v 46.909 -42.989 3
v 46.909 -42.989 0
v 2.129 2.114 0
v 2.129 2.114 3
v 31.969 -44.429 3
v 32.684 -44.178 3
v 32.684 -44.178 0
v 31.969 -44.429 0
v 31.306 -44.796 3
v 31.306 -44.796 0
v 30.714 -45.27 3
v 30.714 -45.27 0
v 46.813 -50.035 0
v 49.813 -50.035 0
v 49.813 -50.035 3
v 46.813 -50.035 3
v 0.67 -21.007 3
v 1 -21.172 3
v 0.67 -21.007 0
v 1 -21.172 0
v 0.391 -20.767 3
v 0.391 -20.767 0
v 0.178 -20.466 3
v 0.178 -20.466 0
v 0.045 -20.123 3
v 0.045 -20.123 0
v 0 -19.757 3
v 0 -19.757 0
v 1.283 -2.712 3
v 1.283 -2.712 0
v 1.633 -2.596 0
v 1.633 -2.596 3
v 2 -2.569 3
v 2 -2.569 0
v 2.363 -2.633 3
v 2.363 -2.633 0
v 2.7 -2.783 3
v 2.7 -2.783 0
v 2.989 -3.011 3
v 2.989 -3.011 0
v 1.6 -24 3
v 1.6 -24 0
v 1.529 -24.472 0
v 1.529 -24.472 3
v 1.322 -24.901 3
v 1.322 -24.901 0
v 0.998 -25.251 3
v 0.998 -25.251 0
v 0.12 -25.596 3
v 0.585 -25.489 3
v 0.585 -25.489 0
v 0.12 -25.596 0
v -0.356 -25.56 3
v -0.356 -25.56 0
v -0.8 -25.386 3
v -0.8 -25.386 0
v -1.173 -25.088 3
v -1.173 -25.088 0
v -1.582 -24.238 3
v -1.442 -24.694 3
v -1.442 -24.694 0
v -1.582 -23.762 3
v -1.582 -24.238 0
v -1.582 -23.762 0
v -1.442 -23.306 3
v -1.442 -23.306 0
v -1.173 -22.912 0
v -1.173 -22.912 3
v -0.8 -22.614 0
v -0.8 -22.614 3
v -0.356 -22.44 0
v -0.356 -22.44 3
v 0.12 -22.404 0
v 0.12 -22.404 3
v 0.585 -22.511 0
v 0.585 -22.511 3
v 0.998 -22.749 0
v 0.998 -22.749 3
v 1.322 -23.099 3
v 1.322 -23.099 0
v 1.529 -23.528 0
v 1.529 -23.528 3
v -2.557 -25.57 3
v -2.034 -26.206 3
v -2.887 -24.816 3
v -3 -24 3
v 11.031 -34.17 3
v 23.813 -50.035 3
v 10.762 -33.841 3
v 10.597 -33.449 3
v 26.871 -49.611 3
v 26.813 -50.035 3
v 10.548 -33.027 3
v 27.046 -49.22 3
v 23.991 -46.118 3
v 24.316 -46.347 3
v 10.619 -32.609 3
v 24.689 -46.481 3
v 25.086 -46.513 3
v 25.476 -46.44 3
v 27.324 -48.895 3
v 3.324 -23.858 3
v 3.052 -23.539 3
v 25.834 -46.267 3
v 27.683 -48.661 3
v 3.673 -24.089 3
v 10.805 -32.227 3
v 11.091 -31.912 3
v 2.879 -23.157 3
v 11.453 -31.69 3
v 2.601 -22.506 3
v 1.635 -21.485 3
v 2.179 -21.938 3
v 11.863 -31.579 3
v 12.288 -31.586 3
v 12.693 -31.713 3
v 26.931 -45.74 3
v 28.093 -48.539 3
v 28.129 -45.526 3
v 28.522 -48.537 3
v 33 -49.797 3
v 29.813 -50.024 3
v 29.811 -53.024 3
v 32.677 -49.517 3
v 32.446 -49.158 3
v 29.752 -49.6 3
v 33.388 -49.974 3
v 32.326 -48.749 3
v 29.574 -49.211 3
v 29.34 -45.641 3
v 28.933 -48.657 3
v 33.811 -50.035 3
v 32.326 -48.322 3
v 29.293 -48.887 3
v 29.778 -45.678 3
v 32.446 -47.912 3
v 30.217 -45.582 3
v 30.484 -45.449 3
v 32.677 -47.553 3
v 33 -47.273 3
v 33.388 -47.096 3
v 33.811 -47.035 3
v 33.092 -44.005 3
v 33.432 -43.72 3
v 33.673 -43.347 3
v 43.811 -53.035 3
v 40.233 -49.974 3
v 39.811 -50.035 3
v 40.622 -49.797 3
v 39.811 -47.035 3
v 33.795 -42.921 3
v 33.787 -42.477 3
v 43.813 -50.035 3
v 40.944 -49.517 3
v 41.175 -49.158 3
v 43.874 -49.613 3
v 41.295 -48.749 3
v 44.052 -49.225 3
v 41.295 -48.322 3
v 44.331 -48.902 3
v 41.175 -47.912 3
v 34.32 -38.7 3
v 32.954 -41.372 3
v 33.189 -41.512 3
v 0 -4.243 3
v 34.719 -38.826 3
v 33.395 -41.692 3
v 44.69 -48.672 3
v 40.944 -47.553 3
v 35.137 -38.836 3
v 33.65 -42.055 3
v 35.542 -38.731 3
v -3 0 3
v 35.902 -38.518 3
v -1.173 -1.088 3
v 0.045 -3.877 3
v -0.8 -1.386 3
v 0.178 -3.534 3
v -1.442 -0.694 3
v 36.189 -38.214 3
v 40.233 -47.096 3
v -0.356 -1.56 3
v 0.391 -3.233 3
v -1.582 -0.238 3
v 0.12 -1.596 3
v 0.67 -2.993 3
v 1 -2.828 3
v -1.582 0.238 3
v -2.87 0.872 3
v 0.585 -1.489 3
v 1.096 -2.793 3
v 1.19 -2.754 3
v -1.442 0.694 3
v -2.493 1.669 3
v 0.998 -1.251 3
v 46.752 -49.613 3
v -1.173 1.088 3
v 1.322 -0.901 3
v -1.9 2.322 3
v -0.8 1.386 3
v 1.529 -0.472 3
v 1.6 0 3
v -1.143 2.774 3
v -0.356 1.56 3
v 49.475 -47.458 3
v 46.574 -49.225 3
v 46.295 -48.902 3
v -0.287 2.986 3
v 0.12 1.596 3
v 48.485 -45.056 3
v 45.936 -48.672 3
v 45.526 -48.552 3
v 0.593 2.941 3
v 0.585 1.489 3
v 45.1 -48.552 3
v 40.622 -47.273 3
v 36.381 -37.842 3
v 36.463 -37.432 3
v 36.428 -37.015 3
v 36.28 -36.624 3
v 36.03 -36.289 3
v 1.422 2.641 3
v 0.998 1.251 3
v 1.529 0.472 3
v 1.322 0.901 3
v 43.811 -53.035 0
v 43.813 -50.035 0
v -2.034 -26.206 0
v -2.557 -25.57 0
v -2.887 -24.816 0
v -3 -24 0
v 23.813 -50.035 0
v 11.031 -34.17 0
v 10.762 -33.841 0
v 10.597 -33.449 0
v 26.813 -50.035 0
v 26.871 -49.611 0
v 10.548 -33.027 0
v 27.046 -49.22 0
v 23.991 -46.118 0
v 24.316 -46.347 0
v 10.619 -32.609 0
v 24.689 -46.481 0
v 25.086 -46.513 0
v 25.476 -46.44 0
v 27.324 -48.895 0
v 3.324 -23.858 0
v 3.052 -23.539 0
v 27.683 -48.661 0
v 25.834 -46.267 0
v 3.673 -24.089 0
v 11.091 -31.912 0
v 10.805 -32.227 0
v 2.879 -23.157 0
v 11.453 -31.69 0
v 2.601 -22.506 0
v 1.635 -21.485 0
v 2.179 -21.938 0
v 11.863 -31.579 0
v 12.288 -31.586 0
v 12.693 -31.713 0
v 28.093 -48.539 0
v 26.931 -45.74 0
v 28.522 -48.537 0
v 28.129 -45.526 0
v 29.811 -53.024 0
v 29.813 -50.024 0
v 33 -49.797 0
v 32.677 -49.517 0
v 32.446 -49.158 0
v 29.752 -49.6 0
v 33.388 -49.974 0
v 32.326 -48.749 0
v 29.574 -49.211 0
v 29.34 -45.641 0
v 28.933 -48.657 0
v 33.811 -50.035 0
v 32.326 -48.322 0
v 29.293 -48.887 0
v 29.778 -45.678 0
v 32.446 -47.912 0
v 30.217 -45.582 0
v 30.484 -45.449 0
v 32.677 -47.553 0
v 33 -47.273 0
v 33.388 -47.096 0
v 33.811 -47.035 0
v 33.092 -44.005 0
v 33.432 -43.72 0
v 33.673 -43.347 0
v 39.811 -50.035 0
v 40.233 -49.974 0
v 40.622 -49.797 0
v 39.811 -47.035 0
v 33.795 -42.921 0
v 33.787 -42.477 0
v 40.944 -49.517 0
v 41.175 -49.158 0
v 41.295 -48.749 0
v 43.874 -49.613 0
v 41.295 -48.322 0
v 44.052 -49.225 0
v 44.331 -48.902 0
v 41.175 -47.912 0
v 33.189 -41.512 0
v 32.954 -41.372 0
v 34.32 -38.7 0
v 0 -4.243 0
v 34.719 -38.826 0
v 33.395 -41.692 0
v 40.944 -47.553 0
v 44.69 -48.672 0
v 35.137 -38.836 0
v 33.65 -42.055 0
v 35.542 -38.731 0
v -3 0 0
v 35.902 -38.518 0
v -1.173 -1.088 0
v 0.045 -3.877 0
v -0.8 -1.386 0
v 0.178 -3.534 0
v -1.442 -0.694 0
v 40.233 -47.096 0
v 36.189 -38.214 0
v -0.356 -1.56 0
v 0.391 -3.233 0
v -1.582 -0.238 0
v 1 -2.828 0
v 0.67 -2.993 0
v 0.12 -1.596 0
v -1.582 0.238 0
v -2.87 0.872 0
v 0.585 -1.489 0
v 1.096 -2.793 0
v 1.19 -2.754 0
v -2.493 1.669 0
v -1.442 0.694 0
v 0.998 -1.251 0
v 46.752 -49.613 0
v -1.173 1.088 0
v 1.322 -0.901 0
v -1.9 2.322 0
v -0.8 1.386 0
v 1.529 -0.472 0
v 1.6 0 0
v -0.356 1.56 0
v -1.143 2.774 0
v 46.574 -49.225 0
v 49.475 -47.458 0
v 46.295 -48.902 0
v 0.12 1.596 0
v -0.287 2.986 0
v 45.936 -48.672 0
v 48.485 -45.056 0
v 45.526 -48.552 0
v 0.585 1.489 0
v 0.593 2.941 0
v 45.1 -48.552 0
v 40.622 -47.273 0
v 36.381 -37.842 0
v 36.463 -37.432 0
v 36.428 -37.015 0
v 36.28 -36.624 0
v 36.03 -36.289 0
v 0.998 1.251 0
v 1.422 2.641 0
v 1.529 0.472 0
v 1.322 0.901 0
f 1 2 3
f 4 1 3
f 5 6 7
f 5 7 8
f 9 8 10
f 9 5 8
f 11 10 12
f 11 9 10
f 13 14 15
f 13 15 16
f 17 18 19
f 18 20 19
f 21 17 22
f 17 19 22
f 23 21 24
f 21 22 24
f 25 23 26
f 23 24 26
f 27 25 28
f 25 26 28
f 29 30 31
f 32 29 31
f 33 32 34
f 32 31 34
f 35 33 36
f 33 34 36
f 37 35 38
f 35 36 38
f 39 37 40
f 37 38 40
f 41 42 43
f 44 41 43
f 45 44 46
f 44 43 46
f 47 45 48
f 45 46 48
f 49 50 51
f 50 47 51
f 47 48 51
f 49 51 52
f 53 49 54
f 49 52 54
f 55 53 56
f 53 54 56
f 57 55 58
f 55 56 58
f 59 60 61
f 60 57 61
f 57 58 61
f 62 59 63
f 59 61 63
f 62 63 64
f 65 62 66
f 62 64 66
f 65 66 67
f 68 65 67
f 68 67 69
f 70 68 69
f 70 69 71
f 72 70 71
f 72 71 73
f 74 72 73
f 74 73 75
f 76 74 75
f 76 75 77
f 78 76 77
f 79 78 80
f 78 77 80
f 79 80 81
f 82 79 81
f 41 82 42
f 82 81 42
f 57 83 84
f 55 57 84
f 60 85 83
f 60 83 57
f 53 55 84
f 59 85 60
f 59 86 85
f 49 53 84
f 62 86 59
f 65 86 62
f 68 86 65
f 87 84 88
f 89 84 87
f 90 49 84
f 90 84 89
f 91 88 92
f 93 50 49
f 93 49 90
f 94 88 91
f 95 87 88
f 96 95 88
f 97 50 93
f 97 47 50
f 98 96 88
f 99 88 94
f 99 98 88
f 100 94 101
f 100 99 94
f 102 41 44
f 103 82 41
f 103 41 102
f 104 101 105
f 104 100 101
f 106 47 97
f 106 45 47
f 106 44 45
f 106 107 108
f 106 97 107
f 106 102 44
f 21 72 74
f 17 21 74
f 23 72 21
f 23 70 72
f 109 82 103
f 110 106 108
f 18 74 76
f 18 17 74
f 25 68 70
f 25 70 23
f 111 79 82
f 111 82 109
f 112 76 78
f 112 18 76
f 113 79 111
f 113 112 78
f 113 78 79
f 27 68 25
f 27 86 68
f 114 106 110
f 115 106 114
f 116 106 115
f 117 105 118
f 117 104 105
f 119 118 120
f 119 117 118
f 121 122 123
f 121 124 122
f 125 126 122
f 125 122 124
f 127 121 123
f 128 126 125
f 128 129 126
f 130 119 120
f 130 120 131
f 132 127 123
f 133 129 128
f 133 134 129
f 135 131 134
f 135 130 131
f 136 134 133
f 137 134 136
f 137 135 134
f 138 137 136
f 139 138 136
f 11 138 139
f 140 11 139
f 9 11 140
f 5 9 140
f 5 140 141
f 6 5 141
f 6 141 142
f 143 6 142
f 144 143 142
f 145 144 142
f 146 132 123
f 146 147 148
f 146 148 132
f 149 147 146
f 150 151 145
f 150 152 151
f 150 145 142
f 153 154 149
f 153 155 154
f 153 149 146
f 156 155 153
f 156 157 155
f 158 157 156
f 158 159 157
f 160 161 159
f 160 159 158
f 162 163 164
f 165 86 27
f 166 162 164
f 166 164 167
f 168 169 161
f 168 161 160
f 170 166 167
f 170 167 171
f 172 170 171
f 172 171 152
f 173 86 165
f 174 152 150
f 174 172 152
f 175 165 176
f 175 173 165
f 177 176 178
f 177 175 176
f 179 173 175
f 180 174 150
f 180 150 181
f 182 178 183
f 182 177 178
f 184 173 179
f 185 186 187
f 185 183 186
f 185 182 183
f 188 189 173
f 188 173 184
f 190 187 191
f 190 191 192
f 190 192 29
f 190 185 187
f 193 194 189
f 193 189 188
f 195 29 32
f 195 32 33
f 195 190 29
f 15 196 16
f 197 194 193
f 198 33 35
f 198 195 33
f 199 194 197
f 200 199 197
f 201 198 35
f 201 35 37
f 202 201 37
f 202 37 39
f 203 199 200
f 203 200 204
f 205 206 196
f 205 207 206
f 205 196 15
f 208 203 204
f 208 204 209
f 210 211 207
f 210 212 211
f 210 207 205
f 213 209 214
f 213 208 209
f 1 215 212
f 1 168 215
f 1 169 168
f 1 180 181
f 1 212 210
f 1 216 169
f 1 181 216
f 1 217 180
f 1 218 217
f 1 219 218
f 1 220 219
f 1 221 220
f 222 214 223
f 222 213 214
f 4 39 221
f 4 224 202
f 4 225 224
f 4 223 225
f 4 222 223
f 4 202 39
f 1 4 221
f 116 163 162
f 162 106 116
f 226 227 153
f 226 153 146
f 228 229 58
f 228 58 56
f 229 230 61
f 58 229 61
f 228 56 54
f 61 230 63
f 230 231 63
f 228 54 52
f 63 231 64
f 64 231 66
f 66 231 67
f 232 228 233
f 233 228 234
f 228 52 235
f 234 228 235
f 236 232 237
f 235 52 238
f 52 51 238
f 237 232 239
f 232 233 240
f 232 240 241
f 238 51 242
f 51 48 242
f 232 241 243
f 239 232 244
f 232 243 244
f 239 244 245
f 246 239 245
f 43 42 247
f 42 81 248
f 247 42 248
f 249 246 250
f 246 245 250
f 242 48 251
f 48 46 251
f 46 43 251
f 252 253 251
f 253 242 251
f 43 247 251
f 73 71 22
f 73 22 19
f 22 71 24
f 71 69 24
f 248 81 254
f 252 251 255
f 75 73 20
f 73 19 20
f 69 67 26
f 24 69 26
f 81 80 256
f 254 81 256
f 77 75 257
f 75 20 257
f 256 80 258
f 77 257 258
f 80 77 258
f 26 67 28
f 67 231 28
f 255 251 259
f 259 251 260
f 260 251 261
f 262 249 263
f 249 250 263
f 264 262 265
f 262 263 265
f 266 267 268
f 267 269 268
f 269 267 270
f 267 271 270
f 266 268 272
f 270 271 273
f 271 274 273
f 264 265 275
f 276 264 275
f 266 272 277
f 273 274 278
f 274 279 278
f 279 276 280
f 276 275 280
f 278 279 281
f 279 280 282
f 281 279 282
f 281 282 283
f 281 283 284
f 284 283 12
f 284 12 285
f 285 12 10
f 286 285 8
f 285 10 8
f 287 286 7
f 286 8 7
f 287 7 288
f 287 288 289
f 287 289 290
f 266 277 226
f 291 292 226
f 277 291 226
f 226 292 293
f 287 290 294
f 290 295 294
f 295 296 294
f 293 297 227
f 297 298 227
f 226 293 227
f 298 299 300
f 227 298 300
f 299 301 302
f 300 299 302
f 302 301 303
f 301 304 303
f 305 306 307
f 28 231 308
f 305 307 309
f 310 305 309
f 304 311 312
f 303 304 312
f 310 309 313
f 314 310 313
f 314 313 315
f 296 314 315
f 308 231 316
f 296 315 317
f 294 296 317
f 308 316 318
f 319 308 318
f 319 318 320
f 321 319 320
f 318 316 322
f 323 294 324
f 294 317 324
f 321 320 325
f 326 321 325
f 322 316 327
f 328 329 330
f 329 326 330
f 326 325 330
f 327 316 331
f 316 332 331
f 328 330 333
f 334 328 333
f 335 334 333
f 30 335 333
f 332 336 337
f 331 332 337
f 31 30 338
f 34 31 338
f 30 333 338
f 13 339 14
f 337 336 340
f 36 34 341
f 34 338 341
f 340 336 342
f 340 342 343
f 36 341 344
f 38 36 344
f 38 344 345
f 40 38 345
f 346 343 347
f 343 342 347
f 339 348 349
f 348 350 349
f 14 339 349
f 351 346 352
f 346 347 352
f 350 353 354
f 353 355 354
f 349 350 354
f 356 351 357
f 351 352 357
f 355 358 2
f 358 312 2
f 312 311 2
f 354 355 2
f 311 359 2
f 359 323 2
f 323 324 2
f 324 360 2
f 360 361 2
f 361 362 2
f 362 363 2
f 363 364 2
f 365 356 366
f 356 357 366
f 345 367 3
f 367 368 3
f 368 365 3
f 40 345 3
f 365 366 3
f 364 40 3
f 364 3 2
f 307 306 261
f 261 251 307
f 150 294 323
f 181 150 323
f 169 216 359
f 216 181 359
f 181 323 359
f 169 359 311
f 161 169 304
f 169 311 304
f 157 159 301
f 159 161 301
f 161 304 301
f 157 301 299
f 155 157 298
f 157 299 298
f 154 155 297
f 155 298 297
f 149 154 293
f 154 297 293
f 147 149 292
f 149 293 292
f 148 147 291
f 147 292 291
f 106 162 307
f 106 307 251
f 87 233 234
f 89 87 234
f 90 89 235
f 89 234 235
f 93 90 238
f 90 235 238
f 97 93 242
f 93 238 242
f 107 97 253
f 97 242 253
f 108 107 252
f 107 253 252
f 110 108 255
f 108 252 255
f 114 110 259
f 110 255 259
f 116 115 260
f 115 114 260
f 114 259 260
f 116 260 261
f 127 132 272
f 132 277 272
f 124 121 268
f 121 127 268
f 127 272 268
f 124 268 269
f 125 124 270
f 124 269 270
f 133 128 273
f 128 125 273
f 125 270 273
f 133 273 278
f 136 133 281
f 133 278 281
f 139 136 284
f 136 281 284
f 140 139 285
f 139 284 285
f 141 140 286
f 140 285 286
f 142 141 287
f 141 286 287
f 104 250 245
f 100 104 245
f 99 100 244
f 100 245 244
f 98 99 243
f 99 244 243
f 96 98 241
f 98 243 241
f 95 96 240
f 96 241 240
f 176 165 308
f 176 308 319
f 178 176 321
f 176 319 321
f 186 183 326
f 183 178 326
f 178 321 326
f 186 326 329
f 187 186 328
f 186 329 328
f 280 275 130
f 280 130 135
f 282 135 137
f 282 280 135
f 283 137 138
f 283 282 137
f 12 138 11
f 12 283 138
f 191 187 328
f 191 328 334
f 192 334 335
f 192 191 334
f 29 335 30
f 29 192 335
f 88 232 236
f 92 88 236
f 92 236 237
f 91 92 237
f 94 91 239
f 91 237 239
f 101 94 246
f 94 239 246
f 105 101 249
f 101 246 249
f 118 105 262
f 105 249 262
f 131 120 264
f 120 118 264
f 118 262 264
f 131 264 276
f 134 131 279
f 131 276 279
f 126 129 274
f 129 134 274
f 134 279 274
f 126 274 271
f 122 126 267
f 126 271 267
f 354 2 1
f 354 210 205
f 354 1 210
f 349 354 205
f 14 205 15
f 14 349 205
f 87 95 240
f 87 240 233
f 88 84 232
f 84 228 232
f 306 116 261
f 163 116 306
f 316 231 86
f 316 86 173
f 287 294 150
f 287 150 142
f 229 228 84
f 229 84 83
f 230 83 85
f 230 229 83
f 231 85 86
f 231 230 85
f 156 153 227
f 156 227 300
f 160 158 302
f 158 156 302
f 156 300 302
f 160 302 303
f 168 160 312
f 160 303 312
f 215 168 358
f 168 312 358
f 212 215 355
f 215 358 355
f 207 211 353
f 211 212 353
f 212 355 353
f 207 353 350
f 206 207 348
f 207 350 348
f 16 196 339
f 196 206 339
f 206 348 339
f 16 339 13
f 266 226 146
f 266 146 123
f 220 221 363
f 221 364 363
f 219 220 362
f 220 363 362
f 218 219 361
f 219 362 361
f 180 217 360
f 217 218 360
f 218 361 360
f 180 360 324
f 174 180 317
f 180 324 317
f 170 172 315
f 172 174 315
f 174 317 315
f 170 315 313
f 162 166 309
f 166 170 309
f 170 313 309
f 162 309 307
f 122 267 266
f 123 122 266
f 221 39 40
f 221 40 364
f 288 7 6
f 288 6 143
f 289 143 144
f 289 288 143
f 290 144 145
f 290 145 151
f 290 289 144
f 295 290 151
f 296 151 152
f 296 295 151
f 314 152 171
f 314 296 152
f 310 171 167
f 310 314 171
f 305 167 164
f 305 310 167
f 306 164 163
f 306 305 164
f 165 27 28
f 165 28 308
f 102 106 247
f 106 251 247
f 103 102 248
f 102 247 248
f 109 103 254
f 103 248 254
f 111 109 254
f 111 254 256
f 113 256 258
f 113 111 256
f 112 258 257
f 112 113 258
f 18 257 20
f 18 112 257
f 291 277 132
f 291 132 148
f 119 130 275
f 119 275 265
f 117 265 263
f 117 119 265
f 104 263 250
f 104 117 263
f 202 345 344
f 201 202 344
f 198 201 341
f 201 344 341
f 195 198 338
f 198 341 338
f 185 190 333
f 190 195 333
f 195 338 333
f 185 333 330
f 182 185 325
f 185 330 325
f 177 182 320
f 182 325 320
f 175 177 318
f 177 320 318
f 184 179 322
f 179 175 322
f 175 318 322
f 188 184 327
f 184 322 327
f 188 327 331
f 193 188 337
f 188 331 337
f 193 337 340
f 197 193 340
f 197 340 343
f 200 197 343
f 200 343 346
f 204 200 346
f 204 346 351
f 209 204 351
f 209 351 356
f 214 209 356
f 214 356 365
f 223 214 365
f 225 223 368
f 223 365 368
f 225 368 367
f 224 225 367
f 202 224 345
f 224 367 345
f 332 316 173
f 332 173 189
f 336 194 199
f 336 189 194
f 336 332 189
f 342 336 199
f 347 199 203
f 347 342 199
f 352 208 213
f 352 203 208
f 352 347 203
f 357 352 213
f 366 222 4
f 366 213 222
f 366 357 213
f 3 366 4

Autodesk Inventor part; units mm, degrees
ref_plane "YZ Plane" through (0, 0, 0) normal (1, 0, 0) x (0, 1, 0)
ref_plane "XZ Plane" through (0, 0, 0) normal (0, 1, 0) x (-1, 0, 0)
ref_plane "XY Plane" through (0, 0, 0) normal (0, 0, 1) x (1, 0, 0)
sketch "スケッチ1" plane through (0, 0, 0) normal (0, 0, 1) x (1, 0, 0)
  circle A0 centre (0, 0) radius 1.6
  arc A1 (2.1289, 2.1137) -> (-3, 0) centre (0, 0) ccw
  line L0 (43.813, -50.0351) -> (43.8106, -53.0351) projected
  line L1 (29.813, -50.0239) -> (29.8106, -53.0239) projected
  line L2 (46.9094, -42.9894) -> (2.1289, 2.1137)
  arc A2 (49.813, -50.0351) -> (46.9094, -42.9894) centre (39.813, -50.0351) ccw
  line L3 (49.813, -50.0351) -> (49.813, -50.0351)
  line L4 (49.813, -50.0351) -> (46.813, -50.0351)
  arc A3 (46.813, -50.0351) -> (43.813, -50.0351) centre (45.313, -50.0363) ccw
  line L5 (43.8106, -53.0351) -> (29.8106, -53.0239)
  arc A4 (29.813, -50.0239) -> (26.8131, -50.0351) centre (28.313, -50.0227) ccw
  line L6 (39.8106, -48.5351) -> (33.8106, -48.5351) construction
  line L7 (39.8106, -47.0351) -> (33.8106, -47.0351)
  line L8 (33.8106, -50.0351) -> (39.8106, -50.0351)
  arc A5 (39.8106, -50.0351) -> (39.8106, -47.0351) centre (39.8106, -48.5351) ccw
  arc A6 (33.8106, -47.0351) -> (33.8106, -50.0351) centre (33.8106, -48.5351) ccw
  line L9 (23.8131, -50.0351) -> (26.8131, -50.0351)
  circle A7 centre (0, -24) radius 1.6
  arc A8 (-3, -24) -> (-2.0335, -26.2056) centre (0, -24) ccw
  line L10 (-3, -24) -> (-3, 0)
  line L11 (-2.0335, -26.2056) -> (23.8131, -50.0351)
  point P0 (36.8106, -53.0295)
  point P1 (36.8106, -48.5351)
  point P2 (36.8106, -50.0351)
  dimension "d0" = 3.2
  dimension "d1" = 6
  dimension "d4" = 1.5
  dimension "d5" = 3
  dimension "d8" = 6
  dimension "d9" = 1.5
  dimension "d10" = 3
  dimension "d13" = 10
  dimension "d14" = 3.2
  dimension "d15" = 24
extrude "押し出し1" add sketch "スケッチ1" along normal blind 3
sketch "スケッチ2" plane through (0, 0, 3) normal (0, 0, 1) x (1, 0, 0)
  arc A0 (39.8106, -50.0351) -> (39.8106, -47.0351) centre (39.8106, -48.5351) ccw projected
  line L0 (39.8106, -50.0351) -> (33.8106, -50.0351) projected
  arc A1 (33.8106, -47.0351) -> (33.8106, -50.0351) centre (33.8106, -48.5351) ccw projected
  line L1 (33.8106, -47.0351) -> (39.8106, -47.0351) projected
  circle A2 centre (0, -24) radius 1.6 projected
  circle A3 centre (0, 0) radius 1.6 projected
  arc A4 (46.813, -50.0351) -> (43.813, -50.0351) centre (45.313, -50.0363) ccw projected
  line L2 (46.813, -50.0351) -> (49.813, -50.0351) projected
  arc A5 (49.813, -50.0351) -> (46.9094, -42.9894) centre (39.813, -50.0351) ccw projected
  line L3 (46.9094, -42.9894) -> (2.1289, 2.1137) projected
  arc A6 (2.1289, 2.1137) -> (-3, 0) centre (0, 0) ccw projected
  line L4 (-3, 0) -> (-3, -24) projected
  arc A7 (-3, -24) -> (-2.0335, -26.2056) centre (0, -24) ccw projected
  line L5 (-2.0335, -26.2056) -> (23.8131, -50.0351) projected
  line L6 (23.8131, -50.0351) -> (26.8131, -50.0351) projected
  arc A8 (29.813, -50.0239) -> (26.8131, -50.0351) centre (28.313, -50.0227) ccw projected
  line L7 (29.813, -50.0239) -> (29.8106, -53.0239) projected
  line L8 (29.8106, -53.0239) -> (43.8106, -53.0351) projected
  line L9 (43.8106, -53.0351) -> (43.813, -50.0351) projected
  arc A9 (45.1777, -45.5383) -> (44.7805, -45.1031) centre (39.813, -50.0351) ccw
  arc A10 (45.1777, -45.5383) -> (40.813, -50.0327) centre (45.313, -50.0363) ccw
  line L10 (40.813, -50.0327) -> (32.813, -50.0263)
  arc A11 (39.8106, -53.0351) -> (43.4781, -45.9274) centre (39.8106, -48.5351) ccw
  line L11 (39.8106, -53.0351) -> (33.8106, -53.0351)
  line L12 (33.8106, -44.0351) -> (38.5389, -44.0351)
  line L13 (0, -24) -> (45.1777, -45.5383) construction
  arc A12 (0, -22.5) -> (-0.6455, -25.354) centre (0, -24) ccw
  arc A13 (44.5321, -46.8923) -> (45.8232, -44.1843) centre (45.1777, -45.5383) ccw
  line L14 (43.0134, -46.1682) -> (44.5321, -46.8923)
  arc A14 (32.813, -50.0263) -> (32.3777, -48.0917) centre (28.313, -50.0227) ccw
  arc A15 (30.1517, -45.9155) -> (24.9646, -47.0163) centre (28.313, -50.0227) ccw
  arc A16 (33.8106, -44.0351) -> (30.1517, -45.9155) centre (33.8106, -48.5351) ccw
  arc A17 (29.3269, -48.9172) -> (33.8106, -53.0351) centre (33.8106, -48.5351) ccw
  line L15 (0, 0) -> (1.1273, -1.1354)
  line L16 (2.1137, -2.1289) -> (42.1113, -42.4147)
  line L17 (0, -1.6) -> (0, 0)
  arc A18 (2.1289, 2.1137) -> (-3, 0) centre (0, 0) ccw
  arc A19 (0, -3) -> (2.1137, -2.1289) centre (0, 0) ccw
  line L18 (-0.6455, -25.354) -> (1.6997, -26.4721)
  line L19 (3.7325, -27.4412) -> (38.5389, -44.0351)
  line L20 (24.9646, -47.0163) -> (3.7325, -27.4412)
  line L21 (2.2056, -26.0335) -> (0, -24)
  line L22 (42.1113, -42.4147) -> (2.9907, -23.7641)
  line L23 (1.1481, -22.8856) -> (0.6455, -22.646)
  line L24 (0, -24) -> (0, -22.4)
  line L25 (0, -21) -> (0, -3)
  arc A20 (2.9907, -23.7641) -> (0, -21) centre (0, -24) ccw
  arc A21 (-3, -24) -> (2.2056, -26.0335) centre (0, -24) ccw
  point P0 (22.5888, -34.7692)
  dimension "d17" = 3
  dimension "d18" = 3
extrude "押し出し2" cut sketch "スケッチ2" against normal blind 3 contours A16 A15 L20 L19 L12 | L16 L22 A20 L25 A19
fillet "フィレット1" radius 1.5 9 edges at (24.9646, -47.0163, 1.5) (30.1517, -45.9155, 1.5) (38.5389, -44.0351, 1.5) (3.7325, -27.4412, 1.5) (0, -21, 1.5) (2.9907, -23.7641, 1.5) (0, -3, 1.5) (2.1137, -2.1289, 1.5) (42.1113, -42.4147, 1.5)
properties part number "Tens1"
